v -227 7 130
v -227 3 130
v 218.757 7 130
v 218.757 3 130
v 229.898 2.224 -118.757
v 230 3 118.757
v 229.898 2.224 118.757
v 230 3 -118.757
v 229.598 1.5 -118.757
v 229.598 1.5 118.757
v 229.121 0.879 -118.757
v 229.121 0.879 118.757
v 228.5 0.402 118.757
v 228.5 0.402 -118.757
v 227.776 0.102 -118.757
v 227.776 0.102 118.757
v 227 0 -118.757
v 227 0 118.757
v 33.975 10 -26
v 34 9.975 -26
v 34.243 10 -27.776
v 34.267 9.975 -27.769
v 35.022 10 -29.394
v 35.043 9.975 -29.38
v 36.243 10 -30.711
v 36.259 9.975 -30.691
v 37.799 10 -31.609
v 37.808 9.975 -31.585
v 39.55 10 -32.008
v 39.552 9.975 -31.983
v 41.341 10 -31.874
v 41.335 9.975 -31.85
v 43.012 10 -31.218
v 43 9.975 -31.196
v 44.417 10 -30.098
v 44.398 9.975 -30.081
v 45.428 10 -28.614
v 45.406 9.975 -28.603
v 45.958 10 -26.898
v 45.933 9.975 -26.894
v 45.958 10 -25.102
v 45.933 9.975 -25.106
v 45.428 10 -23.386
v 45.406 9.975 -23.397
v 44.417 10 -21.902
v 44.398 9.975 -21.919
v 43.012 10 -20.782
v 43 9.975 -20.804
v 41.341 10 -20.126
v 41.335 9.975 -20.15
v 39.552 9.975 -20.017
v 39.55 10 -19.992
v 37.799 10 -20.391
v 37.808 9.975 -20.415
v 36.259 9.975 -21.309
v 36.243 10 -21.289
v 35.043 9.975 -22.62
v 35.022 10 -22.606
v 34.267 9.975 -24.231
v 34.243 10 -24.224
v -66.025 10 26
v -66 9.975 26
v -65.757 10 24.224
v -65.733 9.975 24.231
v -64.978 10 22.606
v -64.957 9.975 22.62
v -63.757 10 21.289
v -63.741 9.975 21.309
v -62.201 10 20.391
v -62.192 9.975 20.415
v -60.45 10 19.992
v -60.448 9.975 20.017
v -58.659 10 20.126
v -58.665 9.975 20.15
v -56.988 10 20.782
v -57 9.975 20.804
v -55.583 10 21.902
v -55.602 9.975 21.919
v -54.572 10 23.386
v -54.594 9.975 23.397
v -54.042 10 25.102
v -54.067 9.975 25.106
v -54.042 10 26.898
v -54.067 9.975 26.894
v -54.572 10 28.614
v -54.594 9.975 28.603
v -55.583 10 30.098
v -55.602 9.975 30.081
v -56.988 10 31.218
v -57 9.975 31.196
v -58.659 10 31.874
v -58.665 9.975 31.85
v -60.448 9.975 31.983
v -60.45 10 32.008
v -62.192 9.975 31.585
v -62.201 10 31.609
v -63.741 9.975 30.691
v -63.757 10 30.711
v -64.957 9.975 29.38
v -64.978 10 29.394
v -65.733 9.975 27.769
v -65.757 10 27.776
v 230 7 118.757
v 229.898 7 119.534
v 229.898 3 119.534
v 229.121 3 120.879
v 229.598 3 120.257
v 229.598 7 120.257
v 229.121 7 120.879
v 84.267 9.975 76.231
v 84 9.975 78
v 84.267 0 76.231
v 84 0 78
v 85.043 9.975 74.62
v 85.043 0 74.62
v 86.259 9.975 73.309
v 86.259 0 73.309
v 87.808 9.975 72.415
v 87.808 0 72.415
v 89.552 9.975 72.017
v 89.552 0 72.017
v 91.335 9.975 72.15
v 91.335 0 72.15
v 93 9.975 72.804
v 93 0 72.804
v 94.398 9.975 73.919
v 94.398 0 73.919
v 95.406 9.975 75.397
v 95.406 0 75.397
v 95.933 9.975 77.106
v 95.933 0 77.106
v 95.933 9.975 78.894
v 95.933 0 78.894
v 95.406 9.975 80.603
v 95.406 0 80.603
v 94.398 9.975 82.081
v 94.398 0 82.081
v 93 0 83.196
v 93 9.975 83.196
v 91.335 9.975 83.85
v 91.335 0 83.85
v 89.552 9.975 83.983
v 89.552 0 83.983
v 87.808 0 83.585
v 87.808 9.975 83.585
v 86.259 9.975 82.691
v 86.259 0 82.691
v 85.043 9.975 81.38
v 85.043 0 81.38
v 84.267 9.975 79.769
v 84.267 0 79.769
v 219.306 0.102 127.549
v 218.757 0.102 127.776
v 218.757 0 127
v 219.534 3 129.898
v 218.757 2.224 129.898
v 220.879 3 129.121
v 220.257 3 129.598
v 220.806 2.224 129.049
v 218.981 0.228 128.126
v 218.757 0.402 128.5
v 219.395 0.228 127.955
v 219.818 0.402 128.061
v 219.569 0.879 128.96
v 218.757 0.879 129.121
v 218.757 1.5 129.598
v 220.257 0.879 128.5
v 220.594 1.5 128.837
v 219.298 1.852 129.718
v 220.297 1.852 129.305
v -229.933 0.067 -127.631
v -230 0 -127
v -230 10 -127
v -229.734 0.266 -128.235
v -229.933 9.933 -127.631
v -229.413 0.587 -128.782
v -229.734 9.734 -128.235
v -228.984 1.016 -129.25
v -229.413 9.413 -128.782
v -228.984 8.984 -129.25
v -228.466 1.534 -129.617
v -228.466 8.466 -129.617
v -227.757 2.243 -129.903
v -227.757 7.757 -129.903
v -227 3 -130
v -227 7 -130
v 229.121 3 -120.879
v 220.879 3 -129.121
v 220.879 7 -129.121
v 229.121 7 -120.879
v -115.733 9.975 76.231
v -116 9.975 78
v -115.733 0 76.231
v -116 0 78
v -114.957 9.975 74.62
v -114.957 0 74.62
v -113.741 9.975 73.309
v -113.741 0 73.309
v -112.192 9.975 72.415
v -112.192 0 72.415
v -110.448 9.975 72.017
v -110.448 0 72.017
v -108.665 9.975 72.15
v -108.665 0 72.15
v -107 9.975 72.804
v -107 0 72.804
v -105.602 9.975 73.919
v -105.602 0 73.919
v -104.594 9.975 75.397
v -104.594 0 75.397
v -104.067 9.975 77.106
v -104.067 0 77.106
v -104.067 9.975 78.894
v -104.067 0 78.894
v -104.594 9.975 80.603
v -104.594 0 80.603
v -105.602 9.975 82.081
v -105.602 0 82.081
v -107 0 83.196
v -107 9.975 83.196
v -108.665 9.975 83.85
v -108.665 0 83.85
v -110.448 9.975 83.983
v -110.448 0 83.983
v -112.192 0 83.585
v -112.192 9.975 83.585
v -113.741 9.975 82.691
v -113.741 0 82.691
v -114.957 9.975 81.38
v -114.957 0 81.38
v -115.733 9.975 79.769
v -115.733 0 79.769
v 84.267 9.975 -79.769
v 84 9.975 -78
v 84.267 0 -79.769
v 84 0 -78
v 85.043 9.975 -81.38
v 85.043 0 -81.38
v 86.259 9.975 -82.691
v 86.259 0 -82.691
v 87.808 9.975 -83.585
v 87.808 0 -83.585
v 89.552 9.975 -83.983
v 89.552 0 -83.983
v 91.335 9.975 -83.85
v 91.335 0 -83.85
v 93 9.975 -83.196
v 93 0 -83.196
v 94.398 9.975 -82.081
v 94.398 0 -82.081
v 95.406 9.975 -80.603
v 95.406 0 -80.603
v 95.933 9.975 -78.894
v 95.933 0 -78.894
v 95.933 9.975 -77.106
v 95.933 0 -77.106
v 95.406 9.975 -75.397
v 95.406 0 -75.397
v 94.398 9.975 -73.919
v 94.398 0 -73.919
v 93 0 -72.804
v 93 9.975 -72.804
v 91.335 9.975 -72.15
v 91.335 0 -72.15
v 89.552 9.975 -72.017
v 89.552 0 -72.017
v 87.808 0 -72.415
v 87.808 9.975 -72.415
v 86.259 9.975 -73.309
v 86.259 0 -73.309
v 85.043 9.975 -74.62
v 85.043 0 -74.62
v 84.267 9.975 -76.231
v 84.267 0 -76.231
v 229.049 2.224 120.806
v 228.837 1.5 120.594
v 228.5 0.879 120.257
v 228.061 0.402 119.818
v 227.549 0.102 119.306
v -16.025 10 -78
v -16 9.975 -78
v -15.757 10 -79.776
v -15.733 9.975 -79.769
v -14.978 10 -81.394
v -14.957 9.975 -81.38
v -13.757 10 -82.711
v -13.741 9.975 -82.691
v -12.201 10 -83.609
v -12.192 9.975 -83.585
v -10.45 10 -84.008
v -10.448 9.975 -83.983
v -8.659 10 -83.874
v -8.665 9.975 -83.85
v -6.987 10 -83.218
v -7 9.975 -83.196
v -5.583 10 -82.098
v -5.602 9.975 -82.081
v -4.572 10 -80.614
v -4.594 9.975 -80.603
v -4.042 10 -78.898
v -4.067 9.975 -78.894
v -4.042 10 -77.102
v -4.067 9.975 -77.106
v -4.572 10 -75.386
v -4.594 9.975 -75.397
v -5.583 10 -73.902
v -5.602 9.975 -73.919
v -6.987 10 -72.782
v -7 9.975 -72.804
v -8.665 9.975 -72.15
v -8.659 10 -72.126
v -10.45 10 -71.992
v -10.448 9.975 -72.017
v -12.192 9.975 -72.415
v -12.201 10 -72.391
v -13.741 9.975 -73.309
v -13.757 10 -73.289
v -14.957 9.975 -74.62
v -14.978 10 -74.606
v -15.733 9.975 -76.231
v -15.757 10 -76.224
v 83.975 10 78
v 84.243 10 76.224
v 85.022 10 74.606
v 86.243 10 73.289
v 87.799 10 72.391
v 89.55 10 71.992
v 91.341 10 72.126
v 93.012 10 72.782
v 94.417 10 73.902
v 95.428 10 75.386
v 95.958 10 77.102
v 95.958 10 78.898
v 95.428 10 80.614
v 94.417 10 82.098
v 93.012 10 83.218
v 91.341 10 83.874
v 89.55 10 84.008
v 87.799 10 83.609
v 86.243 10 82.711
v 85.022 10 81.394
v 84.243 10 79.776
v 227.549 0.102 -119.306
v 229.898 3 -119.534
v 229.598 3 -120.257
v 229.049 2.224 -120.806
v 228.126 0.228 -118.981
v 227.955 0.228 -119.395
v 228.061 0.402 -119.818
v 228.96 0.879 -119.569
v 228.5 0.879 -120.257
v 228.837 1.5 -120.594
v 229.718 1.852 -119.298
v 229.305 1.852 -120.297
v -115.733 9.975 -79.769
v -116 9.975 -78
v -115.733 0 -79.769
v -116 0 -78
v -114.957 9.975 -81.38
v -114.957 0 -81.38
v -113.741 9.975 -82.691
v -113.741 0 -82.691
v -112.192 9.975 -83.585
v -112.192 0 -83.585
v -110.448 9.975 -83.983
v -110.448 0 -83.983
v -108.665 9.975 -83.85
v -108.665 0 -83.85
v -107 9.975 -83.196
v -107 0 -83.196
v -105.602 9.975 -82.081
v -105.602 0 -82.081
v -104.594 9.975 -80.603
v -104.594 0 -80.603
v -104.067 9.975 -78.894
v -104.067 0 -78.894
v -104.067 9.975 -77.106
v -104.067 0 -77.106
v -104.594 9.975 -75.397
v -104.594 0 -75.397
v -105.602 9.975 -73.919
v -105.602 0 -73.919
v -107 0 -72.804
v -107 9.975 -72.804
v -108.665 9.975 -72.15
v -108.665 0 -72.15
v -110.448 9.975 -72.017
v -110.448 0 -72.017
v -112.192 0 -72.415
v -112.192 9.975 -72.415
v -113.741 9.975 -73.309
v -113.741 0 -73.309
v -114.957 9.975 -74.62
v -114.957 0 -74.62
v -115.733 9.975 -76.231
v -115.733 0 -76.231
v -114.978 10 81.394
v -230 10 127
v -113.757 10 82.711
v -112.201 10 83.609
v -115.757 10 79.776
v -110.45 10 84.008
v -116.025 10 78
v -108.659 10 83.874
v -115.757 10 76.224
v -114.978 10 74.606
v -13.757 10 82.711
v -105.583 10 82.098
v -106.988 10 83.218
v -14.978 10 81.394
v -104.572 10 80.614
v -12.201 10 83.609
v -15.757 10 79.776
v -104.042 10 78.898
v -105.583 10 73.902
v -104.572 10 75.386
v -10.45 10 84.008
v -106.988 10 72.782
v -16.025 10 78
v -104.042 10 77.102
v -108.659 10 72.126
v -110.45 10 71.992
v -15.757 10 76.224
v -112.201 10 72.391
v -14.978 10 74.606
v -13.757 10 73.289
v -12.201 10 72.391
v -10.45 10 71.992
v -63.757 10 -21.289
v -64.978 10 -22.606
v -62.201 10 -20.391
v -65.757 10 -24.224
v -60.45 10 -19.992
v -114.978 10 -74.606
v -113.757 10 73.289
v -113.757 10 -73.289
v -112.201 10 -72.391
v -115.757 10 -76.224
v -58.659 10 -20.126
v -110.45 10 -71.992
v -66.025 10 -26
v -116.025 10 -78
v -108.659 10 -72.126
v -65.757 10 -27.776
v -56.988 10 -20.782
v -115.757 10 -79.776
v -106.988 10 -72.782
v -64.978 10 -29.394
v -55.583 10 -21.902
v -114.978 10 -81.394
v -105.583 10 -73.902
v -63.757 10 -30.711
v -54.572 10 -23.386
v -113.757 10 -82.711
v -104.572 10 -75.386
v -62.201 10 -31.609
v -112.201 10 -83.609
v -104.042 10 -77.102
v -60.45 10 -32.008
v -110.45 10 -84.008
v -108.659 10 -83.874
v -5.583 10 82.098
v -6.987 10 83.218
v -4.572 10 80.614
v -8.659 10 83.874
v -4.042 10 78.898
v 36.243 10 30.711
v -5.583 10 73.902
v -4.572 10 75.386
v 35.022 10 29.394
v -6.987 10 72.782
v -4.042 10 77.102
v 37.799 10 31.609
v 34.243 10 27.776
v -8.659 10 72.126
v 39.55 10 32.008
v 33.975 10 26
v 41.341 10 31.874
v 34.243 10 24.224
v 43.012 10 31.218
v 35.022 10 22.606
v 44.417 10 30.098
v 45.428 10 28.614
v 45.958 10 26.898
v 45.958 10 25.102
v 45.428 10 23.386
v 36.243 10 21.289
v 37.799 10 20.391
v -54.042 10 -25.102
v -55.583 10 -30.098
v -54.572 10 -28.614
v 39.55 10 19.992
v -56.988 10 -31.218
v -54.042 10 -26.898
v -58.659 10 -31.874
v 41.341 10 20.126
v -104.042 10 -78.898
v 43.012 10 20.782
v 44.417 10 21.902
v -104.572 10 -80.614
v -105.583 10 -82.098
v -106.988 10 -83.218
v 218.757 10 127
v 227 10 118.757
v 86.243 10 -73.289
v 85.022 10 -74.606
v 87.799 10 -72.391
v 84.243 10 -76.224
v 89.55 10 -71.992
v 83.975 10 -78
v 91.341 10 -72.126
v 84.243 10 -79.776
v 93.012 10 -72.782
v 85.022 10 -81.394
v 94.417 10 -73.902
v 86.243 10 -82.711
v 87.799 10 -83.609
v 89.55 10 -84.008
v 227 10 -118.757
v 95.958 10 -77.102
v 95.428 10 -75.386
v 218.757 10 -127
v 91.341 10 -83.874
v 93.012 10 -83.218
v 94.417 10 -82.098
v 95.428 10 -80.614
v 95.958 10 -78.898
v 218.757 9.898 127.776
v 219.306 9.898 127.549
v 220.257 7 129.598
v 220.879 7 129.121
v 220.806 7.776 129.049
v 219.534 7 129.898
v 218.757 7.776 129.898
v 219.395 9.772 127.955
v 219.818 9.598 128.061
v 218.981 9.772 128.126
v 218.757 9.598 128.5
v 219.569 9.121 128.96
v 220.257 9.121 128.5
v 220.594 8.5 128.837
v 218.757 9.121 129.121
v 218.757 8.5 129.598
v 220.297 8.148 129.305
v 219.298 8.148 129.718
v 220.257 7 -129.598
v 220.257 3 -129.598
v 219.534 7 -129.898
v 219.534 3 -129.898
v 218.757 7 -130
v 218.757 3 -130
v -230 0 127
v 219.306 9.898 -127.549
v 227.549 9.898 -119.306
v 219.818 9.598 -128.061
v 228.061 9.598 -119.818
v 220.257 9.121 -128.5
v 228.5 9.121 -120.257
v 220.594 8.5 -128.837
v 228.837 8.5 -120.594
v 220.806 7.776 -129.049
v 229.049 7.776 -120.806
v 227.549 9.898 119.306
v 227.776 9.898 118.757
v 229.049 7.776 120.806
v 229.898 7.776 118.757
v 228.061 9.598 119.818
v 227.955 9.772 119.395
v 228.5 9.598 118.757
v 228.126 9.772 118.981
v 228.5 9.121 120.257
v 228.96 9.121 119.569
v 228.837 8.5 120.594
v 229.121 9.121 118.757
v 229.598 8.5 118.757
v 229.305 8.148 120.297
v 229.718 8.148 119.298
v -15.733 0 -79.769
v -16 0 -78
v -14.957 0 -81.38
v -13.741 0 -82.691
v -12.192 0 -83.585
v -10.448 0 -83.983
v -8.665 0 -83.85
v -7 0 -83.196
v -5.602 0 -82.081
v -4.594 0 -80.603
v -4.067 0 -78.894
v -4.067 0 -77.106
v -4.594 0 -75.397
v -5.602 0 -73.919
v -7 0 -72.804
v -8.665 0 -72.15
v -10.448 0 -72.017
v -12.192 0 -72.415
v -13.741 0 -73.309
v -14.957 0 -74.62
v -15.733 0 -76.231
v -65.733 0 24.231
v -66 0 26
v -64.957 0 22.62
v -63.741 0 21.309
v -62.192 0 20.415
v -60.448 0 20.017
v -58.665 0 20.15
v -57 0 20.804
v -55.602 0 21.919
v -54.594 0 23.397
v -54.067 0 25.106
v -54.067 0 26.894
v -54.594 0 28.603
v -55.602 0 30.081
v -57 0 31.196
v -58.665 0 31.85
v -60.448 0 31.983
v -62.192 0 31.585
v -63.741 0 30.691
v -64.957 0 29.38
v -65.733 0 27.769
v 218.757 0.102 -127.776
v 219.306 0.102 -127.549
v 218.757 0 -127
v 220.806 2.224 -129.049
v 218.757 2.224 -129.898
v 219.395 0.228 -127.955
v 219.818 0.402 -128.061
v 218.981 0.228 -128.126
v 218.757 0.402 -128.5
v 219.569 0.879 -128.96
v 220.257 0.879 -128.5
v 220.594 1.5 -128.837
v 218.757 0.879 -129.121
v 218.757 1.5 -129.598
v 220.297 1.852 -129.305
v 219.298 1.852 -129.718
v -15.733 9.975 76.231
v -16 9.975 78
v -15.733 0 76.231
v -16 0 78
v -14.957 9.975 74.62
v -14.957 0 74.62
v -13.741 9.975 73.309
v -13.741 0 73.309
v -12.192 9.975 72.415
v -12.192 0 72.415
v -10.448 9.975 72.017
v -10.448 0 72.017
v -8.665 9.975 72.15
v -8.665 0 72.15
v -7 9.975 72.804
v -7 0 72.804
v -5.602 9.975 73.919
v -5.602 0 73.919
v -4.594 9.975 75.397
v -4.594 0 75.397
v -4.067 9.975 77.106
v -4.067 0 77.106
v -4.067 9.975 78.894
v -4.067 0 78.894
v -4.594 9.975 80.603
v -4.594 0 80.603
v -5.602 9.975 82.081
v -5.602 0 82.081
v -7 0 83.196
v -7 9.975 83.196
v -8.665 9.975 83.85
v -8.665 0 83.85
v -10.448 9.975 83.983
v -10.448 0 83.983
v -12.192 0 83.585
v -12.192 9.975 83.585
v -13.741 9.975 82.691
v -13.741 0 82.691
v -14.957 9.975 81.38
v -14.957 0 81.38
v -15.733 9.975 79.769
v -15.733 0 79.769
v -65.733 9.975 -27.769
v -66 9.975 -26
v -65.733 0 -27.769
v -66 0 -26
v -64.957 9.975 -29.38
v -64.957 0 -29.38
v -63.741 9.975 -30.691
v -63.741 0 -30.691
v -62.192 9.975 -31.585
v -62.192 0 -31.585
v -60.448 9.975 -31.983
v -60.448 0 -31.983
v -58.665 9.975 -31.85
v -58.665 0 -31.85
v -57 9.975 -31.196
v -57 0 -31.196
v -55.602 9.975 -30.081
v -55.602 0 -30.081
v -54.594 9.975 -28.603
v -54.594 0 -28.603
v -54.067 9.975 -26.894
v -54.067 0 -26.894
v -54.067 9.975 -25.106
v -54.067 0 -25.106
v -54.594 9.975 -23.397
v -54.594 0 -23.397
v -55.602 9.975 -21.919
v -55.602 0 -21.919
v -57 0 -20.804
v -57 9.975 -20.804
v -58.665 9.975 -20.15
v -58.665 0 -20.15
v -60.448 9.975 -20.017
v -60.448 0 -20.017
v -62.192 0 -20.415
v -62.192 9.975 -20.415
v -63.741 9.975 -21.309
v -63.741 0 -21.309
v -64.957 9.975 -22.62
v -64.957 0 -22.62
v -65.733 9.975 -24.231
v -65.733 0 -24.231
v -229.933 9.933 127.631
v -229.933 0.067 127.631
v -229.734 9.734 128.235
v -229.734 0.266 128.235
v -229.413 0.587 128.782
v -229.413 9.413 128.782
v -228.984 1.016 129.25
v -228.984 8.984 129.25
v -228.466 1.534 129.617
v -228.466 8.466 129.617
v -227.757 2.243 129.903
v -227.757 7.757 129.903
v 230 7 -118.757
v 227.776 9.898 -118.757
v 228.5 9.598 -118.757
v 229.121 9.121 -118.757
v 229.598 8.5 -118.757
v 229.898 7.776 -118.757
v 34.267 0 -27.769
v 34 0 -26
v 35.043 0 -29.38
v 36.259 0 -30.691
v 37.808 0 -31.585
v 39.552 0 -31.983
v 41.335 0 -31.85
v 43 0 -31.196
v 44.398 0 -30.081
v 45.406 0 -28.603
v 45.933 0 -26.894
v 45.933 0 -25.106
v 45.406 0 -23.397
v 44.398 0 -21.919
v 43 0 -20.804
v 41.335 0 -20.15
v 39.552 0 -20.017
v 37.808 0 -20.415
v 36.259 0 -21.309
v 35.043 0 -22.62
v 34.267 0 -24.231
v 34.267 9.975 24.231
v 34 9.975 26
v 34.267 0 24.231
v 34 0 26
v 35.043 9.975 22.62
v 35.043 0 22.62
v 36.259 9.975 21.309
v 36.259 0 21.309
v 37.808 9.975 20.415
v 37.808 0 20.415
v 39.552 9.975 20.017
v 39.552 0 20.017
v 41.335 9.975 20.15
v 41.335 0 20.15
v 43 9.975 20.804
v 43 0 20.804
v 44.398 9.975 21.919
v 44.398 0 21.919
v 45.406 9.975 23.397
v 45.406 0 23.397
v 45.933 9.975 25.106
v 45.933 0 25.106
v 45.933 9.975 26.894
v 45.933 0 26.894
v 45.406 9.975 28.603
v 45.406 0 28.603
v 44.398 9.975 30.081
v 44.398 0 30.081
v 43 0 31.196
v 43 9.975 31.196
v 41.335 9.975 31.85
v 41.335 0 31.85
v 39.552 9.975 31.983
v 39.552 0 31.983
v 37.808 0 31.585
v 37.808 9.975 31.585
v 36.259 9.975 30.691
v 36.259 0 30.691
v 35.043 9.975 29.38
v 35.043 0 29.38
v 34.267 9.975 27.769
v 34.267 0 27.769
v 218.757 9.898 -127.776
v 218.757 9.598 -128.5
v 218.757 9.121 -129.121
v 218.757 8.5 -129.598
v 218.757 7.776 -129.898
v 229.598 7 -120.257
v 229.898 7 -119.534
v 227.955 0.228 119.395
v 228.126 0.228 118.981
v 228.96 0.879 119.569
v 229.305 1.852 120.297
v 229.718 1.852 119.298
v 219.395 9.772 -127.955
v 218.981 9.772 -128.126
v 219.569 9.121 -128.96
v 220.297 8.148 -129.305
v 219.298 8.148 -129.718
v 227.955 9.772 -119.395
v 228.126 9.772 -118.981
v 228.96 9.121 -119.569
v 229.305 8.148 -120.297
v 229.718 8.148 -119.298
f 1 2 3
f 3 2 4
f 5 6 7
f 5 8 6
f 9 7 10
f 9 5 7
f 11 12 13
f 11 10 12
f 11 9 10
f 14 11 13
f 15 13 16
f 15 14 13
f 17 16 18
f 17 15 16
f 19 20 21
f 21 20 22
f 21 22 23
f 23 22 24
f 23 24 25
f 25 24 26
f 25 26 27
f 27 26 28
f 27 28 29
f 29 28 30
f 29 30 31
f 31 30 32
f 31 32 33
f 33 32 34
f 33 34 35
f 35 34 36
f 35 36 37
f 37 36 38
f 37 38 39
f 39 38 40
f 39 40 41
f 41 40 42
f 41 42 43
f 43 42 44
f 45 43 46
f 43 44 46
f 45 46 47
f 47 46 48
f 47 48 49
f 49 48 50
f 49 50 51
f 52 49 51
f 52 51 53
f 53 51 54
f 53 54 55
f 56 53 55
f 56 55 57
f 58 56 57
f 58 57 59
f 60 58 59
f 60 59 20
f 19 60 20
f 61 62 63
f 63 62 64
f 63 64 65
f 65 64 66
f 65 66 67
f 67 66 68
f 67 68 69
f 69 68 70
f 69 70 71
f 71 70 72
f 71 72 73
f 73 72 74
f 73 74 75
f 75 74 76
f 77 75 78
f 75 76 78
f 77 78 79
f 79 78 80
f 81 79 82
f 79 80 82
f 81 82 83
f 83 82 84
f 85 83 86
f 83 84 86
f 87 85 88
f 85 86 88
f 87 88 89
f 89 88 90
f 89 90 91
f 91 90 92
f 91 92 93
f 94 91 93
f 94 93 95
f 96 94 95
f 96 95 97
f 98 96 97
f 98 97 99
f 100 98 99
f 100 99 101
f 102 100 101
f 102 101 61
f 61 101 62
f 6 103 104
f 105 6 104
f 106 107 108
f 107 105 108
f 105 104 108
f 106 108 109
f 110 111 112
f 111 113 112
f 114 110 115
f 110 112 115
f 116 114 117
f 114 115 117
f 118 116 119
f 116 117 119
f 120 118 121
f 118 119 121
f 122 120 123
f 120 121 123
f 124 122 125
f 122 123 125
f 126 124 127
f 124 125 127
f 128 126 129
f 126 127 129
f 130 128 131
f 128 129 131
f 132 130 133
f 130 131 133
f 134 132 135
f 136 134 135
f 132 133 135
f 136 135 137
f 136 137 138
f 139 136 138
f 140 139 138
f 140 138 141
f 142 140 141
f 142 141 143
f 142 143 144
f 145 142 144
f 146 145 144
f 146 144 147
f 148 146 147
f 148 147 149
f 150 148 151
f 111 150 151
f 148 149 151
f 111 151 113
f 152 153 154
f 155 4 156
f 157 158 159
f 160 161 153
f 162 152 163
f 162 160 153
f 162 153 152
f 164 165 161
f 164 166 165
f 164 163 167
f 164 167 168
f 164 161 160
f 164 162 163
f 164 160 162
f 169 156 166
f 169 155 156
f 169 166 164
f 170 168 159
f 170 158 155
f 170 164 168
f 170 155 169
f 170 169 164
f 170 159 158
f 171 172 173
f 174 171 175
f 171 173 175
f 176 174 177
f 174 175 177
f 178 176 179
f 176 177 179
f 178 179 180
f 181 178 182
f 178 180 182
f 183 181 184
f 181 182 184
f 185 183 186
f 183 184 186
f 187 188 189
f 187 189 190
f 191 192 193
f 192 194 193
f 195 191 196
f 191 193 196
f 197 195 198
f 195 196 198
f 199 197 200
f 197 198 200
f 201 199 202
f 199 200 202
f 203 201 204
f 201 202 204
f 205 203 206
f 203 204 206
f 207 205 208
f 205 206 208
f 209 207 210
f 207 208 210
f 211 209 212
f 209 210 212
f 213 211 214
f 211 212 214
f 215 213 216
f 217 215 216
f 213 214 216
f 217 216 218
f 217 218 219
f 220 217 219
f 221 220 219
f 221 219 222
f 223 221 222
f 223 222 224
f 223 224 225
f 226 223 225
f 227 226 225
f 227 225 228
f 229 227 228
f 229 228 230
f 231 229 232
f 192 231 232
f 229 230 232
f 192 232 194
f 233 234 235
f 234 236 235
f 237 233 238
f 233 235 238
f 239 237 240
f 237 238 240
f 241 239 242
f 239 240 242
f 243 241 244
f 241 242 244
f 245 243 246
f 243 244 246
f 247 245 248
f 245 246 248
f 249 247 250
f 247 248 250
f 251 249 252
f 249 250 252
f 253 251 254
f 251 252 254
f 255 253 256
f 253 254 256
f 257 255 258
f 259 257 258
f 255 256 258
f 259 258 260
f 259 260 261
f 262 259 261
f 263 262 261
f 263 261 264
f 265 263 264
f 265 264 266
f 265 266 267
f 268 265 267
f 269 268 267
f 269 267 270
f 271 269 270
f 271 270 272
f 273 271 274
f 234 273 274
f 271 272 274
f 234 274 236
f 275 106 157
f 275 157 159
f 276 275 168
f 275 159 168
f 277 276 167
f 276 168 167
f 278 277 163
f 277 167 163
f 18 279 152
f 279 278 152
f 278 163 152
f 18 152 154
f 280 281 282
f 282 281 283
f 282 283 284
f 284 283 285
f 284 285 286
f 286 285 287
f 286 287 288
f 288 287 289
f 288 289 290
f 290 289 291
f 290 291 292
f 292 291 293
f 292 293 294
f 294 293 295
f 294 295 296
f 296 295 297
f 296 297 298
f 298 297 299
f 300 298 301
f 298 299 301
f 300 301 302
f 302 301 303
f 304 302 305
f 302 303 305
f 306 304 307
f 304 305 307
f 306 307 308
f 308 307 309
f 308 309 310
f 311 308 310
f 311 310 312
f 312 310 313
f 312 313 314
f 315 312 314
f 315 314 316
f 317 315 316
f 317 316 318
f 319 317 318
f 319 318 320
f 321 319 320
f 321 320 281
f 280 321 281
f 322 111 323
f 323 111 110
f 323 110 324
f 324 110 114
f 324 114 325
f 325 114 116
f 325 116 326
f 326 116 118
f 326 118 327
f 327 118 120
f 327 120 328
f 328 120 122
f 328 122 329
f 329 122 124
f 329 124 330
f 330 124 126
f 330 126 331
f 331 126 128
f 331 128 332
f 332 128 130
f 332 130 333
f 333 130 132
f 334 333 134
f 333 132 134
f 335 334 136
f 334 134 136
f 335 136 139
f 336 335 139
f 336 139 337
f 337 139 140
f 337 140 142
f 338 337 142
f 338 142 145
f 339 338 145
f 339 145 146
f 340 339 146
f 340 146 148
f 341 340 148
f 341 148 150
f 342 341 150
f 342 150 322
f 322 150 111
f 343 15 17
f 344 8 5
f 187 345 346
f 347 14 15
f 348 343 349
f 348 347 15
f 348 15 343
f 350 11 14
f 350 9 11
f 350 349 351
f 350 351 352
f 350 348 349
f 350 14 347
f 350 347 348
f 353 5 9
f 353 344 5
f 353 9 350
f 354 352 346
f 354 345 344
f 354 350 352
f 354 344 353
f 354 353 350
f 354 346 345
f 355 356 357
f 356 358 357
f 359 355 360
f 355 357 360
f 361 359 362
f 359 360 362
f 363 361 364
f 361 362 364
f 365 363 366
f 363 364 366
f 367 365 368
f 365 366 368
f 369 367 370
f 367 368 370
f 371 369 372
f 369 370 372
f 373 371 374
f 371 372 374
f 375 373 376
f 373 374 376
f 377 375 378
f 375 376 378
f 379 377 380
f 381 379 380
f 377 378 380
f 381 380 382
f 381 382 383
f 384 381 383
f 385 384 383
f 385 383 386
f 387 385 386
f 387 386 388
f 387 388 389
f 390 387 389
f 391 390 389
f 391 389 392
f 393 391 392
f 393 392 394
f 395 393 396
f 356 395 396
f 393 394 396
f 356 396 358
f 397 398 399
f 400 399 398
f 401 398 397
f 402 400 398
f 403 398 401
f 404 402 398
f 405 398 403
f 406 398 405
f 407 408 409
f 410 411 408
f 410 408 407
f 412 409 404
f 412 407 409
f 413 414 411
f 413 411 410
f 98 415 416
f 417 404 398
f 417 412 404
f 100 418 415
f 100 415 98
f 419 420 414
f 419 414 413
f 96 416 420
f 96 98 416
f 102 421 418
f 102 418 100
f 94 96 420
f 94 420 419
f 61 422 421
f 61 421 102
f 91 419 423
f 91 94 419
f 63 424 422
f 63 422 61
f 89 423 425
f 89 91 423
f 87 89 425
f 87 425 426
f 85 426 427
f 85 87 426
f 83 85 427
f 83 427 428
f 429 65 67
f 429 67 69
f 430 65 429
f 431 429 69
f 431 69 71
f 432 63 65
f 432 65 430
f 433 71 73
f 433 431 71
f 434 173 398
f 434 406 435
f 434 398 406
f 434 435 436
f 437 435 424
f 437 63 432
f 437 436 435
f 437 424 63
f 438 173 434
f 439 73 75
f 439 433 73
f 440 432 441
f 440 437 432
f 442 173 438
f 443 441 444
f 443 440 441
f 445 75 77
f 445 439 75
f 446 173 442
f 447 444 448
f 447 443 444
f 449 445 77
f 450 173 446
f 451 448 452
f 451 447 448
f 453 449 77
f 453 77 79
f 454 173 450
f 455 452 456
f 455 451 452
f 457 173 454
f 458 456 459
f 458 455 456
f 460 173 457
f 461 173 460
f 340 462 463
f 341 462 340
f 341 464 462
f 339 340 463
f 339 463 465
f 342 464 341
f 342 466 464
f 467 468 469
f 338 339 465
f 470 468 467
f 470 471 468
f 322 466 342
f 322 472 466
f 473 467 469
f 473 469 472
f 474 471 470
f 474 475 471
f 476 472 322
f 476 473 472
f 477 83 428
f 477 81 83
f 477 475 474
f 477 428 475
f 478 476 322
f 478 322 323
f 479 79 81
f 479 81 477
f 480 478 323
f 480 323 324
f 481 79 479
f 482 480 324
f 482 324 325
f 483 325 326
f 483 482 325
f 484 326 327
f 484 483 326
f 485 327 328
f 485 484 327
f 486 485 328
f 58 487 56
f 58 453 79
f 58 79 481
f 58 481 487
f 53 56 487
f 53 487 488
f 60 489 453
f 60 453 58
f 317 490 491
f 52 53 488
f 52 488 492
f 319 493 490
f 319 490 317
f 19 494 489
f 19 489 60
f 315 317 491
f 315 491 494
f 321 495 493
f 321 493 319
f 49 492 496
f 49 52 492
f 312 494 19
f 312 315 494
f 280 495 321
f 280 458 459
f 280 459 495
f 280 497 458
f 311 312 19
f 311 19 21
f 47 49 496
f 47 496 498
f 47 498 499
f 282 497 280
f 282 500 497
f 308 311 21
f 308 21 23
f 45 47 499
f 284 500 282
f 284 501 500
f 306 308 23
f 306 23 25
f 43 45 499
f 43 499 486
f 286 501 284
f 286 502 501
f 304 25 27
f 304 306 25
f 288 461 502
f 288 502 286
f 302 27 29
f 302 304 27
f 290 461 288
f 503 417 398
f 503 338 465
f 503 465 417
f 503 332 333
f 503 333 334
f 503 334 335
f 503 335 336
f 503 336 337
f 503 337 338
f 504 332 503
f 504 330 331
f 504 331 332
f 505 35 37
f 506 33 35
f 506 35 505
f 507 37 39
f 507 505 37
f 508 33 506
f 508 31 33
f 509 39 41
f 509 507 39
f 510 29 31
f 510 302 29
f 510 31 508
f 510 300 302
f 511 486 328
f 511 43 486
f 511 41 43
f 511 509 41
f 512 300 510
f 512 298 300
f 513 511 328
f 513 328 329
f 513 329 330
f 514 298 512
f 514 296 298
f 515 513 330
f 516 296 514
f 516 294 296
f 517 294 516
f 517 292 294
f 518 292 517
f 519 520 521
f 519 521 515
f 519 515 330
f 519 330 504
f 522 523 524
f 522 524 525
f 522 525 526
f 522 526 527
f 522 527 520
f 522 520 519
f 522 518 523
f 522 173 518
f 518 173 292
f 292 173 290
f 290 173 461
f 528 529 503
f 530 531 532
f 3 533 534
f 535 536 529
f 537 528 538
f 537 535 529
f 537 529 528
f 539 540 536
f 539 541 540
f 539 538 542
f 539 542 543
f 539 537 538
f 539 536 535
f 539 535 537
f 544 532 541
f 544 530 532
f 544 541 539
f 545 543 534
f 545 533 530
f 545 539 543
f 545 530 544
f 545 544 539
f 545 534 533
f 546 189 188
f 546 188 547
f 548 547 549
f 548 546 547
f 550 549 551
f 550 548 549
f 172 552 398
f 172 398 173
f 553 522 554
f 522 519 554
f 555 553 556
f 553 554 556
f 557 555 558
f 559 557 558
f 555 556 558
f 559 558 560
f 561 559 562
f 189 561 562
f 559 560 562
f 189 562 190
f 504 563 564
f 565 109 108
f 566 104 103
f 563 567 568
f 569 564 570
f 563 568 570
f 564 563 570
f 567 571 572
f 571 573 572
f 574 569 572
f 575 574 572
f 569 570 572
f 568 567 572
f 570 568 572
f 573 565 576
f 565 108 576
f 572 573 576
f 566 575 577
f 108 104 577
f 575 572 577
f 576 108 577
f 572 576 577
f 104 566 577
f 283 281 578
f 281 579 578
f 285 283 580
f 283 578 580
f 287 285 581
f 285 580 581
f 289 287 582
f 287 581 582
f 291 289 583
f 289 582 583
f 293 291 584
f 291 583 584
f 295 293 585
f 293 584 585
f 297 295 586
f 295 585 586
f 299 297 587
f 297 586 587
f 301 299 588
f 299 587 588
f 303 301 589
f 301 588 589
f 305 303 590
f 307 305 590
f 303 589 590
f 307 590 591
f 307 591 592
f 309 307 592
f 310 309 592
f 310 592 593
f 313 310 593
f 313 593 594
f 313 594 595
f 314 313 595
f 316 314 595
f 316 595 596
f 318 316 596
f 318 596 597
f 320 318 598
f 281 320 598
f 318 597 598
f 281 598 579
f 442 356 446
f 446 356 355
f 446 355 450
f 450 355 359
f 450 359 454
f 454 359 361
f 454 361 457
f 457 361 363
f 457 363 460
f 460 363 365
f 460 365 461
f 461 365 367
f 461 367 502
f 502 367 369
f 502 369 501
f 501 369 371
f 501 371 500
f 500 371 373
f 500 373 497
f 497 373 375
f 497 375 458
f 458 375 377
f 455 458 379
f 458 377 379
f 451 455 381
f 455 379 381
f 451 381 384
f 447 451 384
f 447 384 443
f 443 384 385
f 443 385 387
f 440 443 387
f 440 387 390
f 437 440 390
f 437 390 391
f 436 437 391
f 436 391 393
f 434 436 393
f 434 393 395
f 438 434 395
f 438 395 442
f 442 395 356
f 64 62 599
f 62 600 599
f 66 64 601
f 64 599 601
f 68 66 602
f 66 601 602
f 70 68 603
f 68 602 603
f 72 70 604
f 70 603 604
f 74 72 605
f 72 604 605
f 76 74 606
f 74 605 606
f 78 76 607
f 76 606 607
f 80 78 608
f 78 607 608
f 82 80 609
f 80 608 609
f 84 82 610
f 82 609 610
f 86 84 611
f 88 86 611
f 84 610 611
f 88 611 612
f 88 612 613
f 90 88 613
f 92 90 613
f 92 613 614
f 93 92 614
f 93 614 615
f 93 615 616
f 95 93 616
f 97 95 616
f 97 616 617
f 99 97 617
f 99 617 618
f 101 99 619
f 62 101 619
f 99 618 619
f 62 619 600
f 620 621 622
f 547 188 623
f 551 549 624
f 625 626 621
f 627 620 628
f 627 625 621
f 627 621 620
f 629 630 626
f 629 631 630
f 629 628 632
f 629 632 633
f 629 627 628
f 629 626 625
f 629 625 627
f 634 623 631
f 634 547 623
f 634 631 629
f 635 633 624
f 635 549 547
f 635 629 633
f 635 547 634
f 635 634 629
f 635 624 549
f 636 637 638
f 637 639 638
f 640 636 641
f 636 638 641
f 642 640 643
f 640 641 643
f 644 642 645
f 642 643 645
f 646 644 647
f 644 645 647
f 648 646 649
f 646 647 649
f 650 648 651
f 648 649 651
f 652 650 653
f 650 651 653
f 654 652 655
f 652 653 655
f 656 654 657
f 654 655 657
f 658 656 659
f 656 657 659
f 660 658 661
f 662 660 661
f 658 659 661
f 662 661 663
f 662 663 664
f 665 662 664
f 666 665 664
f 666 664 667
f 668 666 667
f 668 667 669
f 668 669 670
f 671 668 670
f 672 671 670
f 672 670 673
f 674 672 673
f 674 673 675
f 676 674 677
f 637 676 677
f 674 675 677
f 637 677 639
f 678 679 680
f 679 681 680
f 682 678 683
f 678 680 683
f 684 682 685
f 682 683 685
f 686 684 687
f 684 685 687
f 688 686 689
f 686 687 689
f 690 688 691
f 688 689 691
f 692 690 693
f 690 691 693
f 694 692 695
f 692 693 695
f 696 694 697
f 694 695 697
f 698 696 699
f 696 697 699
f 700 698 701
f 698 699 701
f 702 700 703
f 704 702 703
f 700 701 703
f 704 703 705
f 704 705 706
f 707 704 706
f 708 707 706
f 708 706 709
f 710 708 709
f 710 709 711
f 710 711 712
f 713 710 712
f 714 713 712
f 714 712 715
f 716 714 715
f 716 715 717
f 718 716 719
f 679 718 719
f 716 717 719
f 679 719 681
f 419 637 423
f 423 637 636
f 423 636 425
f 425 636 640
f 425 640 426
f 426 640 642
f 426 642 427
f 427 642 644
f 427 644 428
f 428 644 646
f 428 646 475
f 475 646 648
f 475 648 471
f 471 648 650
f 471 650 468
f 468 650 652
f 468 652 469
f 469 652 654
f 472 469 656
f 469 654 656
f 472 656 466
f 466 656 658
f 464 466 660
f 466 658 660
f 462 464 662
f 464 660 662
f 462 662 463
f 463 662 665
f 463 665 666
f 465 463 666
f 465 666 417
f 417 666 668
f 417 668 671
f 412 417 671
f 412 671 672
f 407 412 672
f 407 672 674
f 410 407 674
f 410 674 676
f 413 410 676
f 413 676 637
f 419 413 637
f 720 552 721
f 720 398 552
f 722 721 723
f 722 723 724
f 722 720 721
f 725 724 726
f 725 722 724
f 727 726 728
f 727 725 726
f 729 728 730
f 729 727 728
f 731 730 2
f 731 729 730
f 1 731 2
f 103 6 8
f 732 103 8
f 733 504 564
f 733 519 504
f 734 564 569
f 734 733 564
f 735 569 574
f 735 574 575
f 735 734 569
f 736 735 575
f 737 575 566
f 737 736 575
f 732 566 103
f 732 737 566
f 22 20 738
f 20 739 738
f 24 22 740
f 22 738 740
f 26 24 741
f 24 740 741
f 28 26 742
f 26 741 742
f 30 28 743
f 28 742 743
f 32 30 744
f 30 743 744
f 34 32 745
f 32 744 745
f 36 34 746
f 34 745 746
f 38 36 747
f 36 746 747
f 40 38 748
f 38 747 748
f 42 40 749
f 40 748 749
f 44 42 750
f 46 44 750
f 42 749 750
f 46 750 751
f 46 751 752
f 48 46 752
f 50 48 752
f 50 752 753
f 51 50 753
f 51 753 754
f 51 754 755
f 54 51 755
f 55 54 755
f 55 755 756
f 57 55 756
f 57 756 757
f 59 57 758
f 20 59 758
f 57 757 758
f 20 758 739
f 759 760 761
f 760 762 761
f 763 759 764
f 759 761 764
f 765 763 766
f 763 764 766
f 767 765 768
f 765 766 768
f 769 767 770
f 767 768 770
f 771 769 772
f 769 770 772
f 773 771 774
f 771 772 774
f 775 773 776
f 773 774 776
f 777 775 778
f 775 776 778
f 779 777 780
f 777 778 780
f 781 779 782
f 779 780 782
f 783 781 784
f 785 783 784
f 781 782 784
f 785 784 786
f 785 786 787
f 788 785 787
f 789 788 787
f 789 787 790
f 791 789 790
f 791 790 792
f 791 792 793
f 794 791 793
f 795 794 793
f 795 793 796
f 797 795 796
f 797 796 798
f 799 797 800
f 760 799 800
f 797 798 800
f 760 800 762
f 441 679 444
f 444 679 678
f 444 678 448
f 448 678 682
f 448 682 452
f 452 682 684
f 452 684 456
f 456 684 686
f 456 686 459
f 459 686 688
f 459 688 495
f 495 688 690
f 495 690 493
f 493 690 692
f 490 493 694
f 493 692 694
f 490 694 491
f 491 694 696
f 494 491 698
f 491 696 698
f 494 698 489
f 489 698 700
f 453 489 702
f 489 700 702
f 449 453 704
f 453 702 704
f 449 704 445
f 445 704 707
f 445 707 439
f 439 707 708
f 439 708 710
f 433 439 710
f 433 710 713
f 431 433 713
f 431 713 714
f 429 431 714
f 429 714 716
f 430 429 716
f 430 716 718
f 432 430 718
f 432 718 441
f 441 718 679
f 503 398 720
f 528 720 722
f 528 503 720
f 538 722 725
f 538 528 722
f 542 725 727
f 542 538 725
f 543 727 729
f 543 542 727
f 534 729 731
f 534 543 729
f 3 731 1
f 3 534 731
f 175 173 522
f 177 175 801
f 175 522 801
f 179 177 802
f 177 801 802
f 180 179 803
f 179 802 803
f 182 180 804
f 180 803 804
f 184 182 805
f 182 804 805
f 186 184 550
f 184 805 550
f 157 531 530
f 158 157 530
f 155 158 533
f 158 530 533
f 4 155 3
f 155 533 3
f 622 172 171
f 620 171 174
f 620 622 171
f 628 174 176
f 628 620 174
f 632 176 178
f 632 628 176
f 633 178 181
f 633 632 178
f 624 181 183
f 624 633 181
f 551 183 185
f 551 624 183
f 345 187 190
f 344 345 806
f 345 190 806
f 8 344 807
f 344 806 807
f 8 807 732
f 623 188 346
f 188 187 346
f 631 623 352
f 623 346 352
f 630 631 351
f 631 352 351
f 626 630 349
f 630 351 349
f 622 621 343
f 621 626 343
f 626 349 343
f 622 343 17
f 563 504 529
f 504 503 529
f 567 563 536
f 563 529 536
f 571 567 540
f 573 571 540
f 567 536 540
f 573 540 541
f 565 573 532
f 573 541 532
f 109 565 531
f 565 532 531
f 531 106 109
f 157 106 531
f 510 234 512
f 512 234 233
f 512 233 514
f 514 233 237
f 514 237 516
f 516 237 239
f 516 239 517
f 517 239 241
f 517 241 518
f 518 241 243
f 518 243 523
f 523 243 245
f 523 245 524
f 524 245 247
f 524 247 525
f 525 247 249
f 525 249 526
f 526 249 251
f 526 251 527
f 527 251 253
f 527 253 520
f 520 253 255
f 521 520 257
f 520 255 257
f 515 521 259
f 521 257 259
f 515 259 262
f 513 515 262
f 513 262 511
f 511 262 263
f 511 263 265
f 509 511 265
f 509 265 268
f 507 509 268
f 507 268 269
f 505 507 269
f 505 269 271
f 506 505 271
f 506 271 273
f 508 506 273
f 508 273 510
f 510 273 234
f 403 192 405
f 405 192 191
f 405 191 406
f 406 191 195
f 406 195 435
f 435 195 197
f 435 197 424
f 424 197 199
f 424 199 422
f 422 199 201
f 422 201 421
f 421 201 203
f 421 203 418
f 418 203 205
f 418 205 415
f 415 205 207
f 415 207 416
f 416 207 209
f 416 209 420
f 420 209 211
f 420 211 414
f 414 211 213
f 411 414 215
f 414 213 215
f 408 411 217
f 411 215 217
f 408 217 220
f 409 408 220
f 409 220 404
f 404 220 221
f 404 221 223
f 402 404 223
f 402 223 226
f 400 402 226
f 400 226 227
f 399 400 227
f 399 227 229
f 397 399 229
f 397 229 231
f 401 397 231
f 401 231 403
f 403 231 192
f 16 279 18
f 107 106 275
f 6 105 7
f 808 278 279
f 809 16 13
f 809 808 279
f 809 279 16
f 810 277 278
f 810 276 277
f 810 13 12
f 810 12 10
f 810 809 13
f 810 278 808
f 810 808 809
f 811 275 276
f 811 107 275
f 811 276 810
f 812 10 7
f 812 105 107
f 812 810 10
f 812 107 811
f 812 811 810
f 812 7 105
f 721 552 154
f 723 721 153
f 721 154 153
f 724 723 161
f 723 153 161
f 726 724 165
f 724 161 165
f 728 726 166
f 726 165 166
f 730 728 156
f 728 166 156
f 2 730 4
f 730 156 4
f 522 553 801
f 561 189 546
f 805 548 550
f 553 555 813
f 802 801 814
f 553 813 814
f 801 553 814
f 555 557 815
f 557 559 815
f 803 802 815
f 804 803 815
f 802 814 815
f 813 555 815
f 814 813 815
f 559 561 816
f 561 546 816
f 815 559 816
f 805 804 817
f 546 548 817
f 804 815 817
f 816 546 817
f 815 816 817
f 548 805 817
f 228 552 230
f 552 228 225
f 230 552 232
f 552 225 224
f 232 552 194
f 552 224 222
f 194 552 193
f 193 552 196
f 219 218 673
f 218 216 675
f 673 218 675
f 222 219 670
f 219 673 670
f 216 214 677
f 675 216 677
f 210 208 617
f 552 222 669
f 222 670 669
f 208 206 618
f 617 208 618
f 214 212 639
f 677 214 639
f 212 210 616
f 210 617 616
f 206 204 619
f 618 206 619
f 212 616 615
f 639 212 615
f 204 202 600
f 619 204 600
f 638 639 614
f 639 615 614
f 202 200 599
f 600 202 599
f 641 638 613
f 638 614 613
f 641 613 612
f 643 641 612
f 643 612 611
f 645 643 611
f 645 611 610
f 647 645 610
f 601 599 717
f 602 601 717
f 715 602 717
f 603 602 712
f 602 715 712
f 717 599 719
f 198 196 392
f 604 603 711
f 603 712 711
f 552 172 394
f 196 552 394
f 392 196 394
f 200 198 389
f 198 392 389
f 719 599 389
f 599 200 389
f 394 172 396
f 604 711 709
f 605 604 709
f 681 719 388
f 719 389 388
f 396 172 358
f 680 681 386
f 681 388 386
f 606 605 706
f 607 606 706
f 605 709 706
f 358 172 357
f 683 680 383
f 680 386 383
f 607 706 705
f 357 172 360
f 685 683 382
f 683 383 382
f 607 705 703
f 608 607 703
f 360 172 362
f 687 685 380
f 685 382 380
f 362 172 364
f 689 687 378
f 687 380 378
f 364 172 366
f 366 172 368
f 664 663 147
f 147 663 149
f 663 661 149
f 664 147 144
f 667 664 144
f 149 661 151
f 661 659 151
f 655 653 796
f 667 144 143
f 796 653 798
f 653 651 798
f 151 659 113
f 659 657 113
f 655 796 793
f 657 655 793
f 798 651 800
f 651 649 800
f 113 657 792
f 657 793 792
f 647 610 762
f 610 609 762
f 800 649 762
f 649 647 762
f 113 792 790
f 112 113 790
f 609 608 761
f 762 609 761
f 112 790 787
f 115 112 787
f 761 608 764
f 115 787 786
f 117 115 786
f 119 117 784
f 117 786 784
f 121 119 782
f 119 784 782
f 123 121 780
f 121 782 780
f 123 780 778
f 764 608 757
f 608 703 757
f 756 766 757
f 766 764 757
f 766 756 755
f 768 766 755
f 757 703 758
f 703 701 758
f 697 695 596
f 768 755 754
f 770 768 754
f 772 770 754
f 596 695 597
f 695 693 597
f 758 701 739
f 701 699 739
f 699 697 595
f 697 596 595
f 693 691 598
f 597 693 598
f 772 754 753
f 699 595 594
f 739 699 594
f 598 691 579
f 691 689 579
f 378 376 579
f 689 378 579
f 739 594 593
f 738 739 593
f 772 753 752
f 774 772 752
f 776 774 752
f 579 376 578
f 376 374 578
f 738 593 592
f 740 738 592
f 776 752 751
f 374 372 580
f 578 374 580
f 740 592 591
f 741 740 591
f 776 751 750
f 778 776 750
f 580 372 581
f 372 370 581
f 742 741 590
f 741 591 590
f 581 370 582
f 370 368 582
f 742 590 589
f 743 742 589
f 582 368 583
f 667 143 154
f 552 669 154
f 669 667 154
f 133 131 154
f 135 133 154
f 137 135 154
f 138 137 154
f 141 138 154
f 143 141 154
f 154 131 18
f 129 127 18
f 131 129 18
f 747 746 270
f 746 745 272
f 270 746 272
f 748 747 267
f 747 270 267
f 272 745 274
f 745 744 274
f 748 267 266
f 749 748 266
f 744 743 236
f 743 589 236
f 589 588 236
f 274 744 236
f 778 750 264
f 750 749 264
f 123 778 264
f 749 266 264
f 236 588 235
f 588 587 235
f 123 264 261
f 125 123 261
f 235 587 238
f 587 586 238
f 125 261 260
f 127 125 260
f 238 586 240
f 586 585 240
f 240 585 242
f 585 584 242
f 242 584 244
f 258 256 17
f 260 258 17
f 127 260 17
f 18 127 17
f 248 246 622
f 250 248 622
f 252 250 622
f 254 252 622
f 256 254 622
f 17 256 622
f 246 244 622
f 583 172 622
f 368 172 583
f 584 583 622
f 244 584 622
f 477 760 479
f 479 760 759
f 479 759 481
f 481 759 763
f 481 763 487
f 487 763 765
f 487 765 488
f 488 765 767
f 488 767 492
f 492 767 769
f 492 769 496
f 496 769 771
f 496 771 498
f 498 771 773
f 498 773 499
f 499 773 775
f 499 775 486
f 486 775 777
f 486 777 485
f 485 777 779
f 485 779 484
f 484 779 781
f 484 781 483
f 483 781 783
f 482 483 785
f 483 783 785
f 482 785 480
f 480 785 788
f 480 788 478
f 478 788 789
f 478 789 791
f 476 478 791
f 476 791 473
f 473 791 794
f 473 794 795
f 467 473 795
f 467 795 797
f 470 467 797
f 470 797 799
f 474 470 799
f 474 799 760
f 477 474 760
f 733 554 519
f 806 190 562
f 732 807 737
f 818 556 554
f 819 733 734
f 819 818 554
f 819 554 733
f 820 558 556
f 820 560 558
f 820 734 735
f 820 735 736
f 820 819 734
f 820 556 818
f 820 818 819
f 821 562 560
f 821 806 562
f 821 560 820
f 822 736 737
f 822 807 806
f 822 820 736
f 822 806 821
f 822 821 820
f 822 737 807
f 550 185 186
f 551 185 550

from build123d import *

# Parameters (mm, degrees)
SKETCH1_W                       = 460
SKETCH1_H                       = 260
BASE_FLANGE1_DEPTH              = 10
BREAK_CORNER1_DEPTH             = 10
M10_CLEARANCE_HOLE1_D           = 12
M10_CLEARANCE_HOLE1_CSINK_D     = 12.05
M10_CLEARANCE_HOLE1_CSINK_ANGLE = 90
FILLET1_R                       = 3


# Read off the part's stored shape, not the designer's step: Break-Corner1
# Sheet-metal steps are written as plain solids
with BuildPart() as part:
    # Sketch1 → Base-Flange1 (new body)
    with BuildSketch(Plane(origin=(0, 0, 0), x_dir=(1, 0, 0), z_dir=(0, 1, 0))):
        Rectangle(SKETCH1_W, SKETCH1_H)
    extrude(amount=BASE_FLANGE1_DEPTH)

    # Break-Corner1 outline → Break-Corner1 (cut)
    with BuildSketch(Plane(origin=(0, 0, 0), x_dir=(1, 0, 0), z_dir=(0, 1, 0))):
        Polygon((230, -130), (230, -120), (220, -130), align=None)
        Polygon((220, 130), (230, 120), (230, 130), align=None)
    extrude(amount=BREAK_CORNER1_DEPTH, mode=Mode.SUBTRACT)

    # M10 Clearance Hole1 (through all)
    with Locations(Plane(origin=(0, 10, 0), x_dir=(1, 0, 0), z_dir=(0, 1, 0))):
        with Locations((-110, 78), (-10, 78), (90, 78), (-60, 26), (40, 26), (-60, -26), (40, -26), (-110, -78), (-10, -78), (90, -78)):
            CounterSinkHole(M10_CLEARANCE_HOLE1_D / 2, M10_CLEARANCE_HOLE1_CSINK_D / 2, counter_sink_angle=M10_CLEARANCE_HOLE1_CSINK_ANGLE)

    # Fillet1
    fillet1_edges = [part.edges().sort_by_distance(p)[0] for p in [
        (230, 0, 0),
        (230, 10, 0),
        (230, 5, 120),
        (225, 0, 125),
        (220, 5, 130),
        (225, 10, 125),
        (-5, 0, -130),
        (-5, 10, -130),
        (220, 5, -130),
        (225, 0, -125),
        (230, 5, -120),
        (225, 10, -125),
        (-5, 0, 130),
        (-230, 5, -130),
        (-230, 5, 130),
        (-5, 10, 130),
    ]]
    fillet(fillet1_edges, radius=FILLET1_R)


solid = part.part
